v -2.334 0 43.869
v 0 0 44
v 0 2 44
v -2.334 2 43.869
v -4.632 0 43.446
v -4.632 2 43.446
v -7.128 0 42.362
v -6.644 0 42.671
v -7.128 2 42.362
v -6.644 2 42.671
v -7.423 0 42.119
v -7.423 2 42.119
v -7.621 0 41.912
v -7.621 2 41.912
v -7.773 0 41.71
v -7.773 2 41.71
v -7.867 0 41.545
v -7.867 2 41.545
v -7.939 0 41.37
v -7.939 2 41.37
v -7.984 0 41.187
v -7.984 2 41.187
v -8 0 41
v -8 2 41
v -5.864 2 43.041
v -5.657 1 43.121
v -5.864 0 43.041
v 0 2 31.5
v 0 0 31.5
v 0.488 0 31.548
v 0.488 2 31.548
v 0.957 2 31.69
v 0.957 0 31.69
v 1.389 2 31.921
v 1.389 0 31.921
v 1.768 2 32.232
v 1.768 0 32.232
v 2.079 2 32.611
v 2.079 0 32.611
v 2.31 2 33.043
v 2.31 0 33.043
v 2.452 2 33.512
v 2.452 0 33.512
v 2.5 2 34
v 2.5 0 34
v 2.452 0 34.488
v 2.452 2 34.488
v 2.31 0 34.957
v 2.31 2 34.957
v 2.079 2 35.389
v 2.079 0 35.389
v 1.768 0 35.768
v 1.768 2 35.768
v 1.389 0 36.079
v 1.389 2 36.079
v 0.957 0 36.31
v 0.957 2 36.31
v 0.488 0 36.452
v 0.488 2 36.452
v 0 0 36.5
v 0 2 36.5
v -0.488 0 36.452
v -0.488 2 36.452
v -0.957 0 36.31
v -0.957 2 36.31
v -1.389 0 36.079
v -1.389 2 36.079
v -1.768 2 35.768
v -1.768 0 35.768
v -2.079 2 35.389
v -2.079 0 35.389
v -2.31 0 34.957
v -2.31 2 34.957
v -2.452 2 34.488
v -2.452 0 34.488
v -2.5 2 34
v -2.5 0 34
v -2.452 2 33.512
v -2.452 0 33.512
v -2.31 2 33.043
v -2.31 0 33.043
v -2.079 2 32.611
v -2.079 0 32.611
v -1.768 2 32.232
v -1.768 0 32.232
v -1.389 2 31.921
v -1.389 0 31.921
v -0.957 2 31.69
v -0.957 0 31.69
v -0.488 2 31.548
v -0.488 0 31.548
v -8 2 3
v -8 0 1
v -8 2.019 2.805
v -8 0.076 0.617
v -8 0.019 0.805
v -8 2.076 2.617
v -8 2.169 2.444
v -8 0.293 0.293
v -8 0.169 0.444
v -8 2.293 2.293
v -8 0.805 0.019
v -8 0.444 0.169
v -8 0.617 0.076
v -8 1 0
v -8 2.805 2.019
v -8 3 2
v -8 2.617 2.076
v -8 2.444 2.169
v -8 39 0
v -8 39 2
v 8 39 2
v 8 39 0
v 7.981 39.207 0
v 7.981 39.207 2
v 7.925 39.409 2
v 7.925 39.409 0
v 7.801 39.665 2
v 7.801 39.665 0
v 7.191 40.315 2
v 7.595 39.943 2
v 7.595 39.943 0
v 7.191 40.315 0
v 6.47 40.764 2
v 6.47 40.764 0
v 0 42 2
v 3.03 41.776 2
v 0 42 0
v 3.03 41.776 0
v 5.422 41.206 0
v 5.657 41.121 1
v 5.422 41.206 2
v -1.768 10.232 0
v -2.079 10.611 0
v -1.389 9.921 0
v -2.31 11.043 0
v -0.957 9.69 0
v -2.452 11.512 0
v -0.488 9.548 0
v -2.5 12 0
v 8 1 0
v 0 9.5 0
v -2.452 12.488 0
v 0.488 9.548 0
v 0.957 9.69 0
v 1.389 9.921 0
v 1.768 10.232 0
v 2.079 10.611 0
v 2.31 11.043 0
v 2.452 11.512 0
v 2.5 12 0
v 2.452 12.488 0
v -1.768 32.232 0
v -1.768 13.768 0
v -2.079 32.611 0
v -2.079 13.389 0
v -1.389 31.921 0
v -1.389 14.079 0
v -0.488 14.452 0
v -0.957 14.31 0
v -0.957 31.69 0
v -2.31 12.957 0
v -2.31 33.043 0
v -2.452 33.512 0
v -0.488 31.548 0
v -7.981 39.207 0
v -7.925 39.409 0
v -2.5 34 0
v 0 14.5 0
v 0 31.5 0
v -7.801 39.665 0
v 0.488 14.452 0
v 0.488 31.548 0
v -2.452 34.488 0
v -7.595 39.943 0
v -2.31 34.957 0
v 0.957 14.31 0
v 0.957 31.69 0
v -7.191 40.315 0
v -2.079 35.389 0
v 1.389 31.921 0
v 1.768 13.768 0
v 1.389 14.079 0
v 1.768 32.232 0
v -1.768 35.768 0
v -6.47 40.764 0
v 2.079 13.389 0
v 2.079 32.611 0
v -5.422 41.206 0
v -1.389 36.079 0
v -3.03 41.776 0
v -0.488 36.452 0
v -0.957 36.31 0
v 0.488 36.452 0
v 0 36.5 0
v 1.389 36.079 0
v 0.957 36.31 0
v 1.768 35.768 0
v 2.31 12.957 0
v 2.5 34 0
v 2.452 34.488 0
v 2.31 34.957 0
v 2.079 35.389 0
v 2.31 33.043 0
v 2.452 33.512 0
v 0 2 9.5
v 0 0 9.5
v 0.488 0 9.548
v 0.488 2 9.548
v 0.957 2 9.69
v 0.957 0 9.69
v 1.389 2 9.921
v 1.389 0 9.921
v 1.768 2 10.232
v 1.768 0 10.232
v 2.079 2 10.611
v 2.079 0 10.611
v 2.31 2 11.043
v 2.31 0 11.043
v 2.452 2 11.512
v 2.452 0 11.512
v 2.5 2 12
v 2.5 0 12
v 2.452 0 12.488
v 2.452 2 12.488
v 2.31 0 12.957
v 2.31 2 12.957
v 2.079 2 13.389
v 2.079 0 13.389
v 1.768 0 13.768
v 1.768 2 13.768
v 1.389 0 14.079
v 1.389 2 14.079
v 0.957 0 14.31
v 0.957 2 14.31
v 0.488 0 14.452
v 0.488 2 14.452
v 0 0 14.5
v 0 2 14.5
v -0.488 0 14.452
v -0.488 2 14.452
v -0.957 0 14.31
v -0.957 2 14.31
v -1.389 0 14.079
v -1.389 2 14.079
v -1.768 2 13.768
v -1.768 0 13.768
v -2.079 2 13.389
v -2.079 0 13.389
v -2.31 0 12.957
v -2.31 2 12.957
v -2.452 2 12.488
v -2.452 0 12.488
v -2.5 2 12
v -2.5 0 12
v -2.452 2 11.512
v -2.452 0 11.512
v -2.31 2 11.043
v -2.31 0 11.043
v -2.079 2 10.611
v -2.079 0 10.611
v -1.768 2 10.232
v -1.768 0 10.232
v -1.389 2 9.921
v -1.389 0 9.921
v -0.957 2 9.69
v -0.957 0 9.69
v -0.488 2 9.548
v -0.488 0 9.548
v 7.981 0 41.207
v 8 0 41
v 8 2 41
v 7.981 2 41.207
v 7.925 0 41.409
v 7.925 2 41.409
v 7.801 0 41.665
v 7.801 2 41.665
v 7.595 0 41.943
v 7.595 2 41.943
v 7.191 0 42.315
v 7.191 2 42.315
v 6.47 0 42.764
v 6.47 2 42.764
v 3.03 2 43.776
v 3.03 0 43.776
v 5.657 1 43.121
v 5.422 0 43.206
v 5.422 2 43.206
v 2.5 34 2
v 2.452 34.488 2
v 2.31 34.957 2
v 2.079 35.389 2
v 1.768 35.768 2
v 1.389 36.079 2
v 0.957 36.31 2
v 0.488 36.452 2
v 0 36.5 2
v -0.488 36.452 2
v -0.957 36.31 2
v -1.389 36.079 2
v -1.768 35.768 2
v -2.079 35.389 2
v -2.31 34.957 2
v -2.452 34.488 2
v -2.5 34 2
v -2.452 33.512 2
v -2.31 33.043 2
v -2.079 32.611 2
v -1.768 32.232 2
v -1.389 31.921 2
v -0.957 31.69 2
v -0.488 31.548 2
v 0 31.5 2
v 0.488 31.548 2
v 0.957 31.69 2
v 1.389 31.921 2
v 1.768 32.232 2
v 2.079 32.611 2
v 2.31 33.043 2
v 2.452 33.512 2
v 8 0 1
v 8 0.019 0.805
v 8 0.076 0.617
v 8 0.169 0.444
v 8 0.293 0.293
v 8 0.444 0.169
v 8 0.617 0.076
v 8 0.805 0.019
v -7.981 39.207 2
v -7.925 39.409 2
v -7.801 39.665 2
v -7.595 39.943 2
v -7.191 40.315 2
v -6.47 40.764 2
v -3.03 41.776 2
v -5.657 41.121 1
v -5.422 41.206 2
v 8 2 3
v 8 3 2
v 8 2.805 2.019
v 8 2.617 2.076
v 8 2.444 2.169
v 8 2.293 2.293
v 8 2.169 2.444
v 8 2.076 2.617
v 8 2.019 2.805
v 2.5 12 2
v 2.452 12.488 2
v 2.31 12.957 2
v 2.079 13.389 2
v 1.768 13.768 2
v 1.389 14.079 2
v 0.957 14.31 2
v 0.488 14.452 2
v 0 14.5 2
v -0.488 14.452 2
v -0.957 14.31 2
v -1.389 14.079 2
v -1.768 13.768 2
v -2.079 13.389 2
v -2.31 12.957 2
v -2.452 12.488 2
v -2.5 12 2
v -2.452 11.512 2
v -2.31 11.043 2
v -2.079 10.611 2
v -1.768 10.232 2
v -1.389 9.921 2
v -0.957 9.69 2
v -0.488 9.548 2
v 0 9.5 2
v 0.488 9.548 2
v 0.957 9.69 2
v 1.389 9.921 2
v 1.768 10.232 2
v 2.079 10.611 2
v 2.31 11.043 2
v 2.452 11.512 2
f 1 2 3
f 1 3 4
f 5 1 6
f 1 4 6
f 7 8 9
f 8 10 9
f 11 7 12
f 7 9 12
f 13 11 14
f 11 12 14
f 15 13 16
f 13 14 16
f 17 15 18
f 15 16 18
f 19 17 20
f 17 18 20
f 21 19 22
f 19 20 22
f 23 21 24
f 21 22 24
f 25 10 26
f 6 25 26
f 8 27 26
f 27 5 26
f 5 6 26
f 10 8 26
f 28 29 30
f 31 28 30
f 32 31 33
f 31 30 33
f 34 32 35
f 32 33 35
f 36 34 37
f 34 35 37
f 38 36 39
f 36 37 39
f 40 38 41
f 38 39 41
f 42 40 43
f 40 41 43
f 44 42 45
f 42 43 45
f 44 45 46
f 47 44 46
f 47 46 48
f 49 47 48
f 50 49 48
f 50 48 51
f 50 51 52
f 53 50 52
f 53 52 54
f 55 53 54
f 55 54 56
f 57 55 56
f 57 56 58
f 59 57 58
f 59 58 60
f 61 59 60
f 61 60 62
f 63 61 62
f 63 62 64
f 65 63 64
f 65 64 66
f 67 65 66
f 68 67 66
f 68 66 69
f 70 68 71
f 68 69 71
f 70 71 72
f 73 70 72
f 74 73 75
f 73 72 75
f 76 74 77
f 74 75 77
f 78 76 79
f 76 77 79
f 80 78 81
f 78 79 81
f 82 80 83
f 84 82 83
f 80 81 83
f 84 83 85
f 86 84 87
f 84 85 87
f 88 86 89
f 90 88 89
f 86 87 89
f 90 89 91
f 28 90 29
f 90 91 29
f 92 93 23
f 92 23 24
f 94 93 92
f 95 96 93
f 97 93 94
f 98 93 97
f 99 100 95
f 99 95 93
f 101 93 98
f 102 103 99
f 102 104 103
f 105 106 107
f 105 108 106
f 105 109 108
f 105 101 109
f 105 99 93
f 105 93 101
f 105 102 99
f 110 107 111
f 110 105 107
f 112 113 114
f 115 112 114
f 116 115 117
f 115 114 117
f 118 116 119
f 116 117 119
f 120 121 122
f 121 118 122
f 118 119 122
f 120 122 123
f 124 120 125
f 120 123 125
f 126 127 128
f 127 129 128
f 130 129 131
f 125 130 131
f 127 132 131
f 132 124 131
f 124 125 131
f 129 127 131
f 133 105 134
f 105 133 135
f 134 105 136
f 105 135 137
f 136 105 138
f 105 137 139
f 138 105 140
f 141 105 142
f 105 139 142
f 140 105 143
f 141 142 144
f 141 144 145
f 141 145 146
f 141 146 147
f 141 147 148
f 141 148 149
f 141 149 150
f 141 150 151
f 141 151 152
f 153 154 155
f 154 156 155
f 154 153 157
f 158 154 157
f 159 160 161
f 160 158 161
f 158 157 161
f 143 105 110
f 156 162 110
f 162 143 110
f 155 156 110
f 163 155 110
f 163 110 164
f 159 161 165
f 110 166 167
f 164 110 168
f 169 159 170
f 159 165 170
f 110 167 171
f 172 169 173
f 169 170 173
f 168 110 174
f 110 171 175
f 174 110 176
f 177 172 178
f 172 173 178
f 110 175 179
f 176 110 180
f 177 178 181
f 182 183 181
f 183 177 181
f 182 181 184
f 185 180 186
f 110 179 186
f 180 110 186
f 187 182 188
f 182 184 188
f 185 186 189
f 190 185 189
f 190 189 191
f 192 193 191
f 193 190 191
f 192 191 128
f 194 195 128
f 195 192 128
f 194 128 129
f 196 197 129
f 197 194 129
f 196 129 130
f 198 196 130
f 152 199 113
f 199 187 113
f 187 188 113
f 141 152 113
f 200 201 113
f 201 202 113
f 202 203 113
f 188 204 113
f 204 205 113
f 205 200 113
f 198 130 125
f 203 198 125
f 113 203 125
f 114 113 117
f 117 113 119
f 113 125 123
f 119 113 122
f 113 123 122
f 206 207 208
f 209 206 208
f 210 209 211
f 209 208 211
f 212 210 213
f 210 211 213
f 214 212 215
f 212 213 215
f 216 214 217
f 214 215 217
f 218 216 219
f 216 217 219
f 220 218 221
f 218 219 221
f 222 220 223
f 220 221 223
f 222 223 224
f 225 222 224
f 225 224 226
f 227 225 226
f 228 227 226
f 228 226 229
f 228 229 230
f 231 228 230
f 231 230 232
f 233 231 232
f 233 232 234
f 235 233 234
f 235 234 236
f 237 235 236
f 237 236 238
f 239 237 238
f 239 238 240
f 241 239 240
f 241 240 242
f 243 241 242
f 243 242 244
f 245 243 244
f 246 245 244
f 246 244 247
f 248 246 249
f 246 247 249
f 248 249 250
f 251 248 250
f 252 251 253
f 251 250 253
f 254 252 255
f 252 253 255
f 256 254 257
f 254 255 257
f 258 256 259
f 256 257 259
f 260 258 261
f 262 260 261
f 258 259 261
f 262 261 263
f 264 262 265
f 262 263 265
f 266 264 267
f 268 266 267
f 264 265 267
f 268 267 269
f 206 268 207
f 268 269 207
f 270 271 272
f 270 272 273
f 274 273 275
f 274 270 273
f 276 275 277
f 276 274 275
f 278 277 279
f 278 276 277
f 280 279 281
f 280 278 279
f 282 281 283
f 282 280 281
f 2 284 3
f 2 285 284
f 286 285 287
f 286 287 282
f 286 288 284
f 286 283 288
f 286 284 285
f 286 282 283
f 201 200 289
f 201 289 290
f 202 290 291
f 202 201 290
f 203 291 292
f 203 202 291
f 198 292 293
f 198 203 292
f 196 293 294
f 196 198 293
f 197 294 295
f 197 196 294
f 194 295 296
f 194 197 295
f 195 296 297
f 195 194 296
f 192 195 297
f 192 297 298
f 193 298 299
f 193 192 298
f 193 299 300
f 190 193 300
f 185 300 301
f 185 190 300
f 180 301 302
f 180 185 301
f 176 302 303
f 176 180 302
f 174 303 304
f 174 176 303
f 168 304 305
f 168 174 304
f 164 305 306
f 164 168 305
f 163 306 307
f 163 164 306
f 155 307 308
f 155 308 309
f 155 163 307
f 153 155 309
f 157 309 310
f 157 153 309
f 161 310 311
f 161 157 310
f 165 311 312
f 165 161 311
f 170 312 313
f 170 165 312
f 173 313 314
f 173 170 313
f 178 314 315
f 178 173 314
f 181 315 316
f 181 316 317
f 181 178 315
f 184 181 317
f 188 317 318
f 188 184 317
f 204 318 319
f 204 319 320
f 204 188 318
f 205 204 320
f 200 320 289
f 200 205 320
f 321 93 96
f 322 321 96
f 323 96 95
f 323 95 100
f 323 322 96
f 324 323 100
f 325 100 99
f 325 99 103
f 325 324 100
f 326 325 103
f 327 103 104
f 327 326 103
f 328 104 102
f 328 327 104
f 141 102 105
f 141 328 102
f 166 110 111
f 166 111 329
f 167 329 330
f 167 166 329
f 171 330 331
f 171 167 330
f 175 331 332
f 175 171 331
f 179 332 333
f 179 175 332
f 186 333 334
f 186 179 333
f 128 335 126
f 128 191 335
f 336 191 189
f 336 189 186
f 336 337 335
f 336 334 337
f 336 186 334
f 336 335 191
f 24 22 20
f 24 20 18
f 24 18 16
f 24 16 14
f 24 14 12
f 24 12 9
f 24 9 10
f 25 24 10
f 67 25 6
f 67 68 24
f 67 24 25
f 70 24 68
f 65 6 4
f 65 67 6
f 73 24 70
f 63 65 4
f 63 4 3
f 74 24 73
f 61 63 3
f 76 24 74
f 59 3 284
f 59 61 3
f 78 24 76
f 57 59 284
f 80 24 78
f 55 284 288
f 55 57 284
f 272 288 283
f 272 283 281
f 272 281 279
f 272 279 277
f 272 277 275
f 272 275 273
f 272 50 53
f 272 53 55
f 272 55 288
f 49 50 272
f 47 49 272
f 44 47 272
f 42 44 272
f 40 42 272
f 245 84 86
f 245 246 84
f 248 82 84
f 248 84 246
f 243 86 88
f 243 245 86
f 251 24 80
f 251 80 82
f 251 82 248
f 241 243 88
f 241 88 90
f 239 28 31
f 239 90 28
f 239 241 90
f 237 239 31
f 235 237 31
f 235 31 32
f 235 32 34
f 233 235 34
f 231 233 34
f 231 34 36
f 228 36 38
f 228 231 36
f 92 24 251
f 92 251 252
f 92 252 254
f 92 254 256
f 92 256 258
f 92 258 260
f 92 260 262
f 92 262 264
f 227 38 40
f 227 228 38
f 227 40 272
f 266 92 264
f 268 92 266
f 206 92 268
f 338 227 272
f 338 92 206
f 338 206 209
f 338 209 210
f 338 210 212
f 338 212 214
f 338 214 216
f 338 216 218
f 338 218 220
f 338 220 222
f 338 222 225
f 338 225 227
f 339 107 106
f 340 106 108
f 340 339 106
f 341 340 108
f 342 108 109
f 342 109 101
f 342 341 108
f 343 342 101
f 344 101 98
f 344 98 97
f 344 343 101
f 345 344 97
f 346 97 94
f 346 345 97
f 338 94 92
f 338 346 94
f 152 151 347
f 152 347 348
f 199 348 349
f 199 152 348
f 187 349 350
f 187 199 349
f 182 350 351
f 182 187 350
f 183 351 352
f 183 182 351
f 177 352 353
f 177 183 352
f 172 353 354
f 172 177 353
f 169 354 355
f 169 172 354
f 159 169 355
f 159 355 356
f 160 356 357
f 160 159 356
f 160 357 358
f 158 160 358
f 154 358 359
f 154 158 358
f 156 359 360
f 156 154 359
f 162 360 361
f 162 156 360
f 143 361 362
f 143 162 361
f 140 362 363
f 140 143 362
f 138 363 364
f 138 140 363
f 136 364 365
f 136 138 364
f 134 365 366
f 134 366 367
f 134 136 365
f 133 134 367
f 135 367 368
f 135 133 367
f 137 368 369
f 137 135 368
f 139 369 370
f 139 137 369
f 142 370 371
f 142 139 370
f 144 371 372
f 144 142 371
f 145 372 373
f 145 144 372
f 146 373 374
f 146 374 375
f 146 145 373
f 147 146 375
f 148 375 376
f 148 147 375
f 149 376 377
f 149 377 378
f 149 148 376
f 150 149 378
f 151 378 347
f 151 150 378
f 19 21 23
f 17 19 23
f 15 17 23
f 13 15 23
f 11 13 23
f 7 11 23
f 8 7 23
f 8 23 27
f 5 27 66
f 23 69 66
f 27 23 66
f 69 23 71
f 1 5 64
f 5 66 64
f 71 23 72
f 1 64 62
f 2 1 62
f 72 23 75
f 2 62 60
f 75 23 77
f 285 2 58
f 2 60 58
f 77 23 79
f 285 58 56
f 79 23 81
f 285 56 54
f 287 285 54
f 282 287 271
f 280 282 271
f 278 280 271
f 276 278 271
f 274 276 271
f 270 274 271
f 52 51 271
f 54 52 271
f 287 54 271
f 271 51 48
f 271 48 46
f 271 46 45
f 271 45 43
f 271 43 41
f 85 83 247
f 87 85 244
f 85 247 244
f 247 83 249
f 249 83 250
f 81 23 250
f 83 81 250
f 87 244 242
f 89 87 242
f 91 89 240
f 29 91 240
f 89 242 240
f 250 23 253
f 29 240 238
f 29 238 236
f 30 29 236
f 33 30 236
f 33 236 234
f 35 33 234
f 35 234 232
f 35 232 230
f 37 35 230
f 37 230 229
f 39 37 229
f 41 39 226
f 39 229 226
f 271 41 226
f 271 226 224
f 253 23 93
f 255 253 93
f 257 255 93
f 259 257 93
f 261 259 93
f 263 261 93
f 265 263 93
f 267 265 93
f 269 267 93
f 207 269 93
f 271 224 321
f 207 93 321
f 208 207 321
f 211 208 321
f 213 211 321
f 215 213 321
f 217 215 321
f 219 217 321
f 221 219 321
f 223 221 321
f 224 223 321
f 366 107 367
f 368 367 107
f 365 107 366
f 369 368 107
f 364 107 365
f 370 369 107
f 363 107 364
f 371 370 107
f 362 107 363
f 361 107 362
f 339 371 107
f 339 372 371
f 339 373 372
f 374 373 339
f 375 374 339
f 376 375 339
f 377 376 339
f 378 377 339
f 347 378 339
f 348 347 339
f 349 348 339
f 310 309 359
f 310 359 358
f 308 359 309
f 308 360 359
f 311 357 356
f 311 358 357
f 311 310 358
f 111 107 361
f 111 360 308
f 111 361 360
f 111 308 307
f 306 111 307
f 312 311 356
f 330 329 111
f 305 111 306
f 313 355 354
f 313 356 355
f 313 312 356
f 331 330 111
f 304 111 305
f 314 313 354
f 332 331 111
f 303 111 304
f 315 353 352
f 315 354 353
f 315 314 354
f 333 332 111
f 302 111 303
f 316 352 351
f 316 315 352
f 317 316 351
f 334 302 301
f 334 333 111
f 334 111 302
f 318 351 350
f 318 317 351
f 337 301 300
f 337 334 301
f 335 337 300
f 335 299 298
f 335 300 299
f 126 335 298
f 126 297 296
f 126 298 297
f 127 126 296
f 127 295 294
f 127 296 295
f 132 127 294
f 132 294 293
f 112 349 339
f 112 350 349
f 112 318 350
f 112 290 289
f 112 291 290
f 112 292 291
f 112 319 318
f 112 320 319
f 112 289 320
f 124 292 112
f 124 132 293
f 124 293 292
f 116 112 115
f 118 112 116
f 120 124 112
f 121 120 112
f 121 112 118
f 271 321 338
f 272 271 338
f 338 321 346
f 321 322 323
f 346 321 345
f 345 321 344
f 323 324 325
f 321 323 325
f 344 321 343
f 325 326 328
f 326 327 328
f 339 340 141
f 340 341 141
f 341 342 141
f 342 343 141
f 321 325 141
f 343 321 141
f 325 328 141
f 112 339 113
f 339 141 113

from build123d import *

# Parameters (mm, degrees)
ESQUISSE1_R             = 2.5
BOSS_EXTRU_1_DEPTH      = 2
ESQUISSE2_W             = 16
ESQUISSE2_H             = 2
BOSS_EXTRU_2_DEPTH      = 42
CONG_1_R                = 1
ENL_V_MAT_EXTRU_1_REACH = 63.351
ESQUISSE3_R             = 2.5
CONG_2_SIZE             = 3
CONG_2_SIZE_2           = 8
CONG_3_SIZE             = 3
CONG_3_SIZE_2           = 8


with BuildPart() as part:
    # Esquisse1 → Boss.-Extru.1 (new body)
    with BuildSketch(Plane.XY):
        Polygon((0, 0), (8, 0), (8, 42), (-8, 42), (-8, 0), align=None)
        with Locations((0, 12)):
            Circle(ESQUISSE1_R, mode=Mode.SUBTRACT)
        with Locations((0, 34)):
            Circle(ESQUISSE1_R, mode=Mode.SUBTRACT)
    extrude(amount=BOSS_EXTRU_1_DEPTH)

    # Esquisse2 → Boss.-Extru.2 (add)
    with BuildSketch(Plane.XY.offset(2)):
        with Locations((0, 1)):
            Rectangle(ESQUISSE2_W, ESQUISSE2_H)
    extrude(amount=BOSS_EXTRU_2_DEPTH)

    # Congé1
    cong_1_edges = [part.edges().sort_by_distance(p)[0] for p in [
        (0, 2, 2),
        (0, 0, 0),
    ]]
    fillet(cong_1_edges, radius=CONG_1_R)

    # Esquisse3 → Enlèv. mat.-Extru.1 (cut, up to next)
    with BuildSketch(Plane.XZ, mode=Mode.PRIVATE) as enl_v_mat_extru_1_sk1:
        with Locations(Location((0, 12, 0), (0, 0, 270))):
            Circle(ESQUISSE3_R)
    enl_v_mat_extru_1_tool1 = extrude(enl_v_mat_extru_1_sk1.sketch, amount=-ENL_V_MAT_EXTRU_1_REACH, mode=Mode.PRIVATE) & part.part
    # Esquisse3 → Enlèv. mat.-Extru.1 (cut, up to next)
    with BuildSketch(Plane.XZ, mode=Mode.PRIVATE) as enl_v_mat_extru_1_sk2:
        with Locations(Location((0, 34, 0), (0, 0, 270))):
            Circle(ESQUISSE3_R)
    enl_v_mat_extru_1_tool2 = extrude(enl_v_mat_extru_1_sk2.sketch, amount=-ENL_V_MAT_EXTRU_1_REACH, mode=Mode.PRIVATE) & part.part
    add(enl_v_mat_extru_1_tool1.solids().sort_by_distance((0, 0, 12))[0], mode=Mode.SUBTRACT)
    add(enl_v_mat_extru_1_tool2.solids().sort_by_distance((0, 0, 34))[0], mode=Mode.SUBTRACT)

    # Congé2
    # an asymmetric fillet: 8, 3 mm, written as the material it takes off along each edge
    with BuildSketch(Plane(origin=(8, 42, -20), x_dir=(0, -1, 0), z_dir=(0, 0, 1))) as cong_2_piece_1:
        with BuildLine():
            Bezier((CONG_2_SIZE, 0), (0, 0), (0, -CONG_2_SIZE_2), weights=[1, 0.707106781, 1])
            Line((0, -CONG_2_SIZE_2), (0, 0))
            Line((0, 0), (CONG_2_SIZE, 0))
        make_face()
    extrude(amount=42, mode=Mode.SUBTRACT)
    with BuildSketch(Plane(origin=(-8, 22, 44), x_dir=(1, 0, 0), z_dir=(0, -1, 0))) as cong_2_piece_2:
        with BuildLine():
            Bezier((CONG_2_SIZE_2, 0), (0, 0), (0, -CONG_2_SIZE), weights=[1, 0.707106781, 1])
            Line((0, -CONG_2_SIZE), (0, 0))
            Line((0, 0), (CONG_2_SIZE_2, 0))
        make_face()
    extrude(amount=42, mode=Mode.SUBTRACT)
    with BuildSketch(Plane(origin=(8, -20, 44), x_dir=(0, 0, -1), z_dir=(0, 1, 0))) as cong_2_piece_3:
        with BuildLine():
            Bezier((CONG_2_SIZE, 0), (0, 0), (0, CONG_2_SIZE_2), weights=[1, 0.707106781, 1])
            Line((0, CONG_2_SIZE_2), (0, 0))
            Line((0, 0), (CONG_2_SIZE, 0))
        make_face()
    extrude(amount=42, mode=Mode.SUBTRACT)

    # Congé3
    # an asymmetric fillet: 8, 3 mm, written as the material it takes off along each edge
    with BuildSketch(Plane(origin=(-8, 42, -20), x_dir=(0, -1, 0), z_dir=(0, 0, 1))) as cong_3_piece_1:
        with BuildLine():
            Bezier((CONG_3_SIZE, 0), (0, 0), (0, CONG_3_SIZE_2), weights=[1, 0.707106781, 1])
            Line((0, CONG_3_SIZE_2), (0, 0))
            Line((0, 0), (CONG_3_SIZE, 0))
        make_face()
    extrude(amount=42, mode=Mode.SUBTRACT)


solid = part.part
